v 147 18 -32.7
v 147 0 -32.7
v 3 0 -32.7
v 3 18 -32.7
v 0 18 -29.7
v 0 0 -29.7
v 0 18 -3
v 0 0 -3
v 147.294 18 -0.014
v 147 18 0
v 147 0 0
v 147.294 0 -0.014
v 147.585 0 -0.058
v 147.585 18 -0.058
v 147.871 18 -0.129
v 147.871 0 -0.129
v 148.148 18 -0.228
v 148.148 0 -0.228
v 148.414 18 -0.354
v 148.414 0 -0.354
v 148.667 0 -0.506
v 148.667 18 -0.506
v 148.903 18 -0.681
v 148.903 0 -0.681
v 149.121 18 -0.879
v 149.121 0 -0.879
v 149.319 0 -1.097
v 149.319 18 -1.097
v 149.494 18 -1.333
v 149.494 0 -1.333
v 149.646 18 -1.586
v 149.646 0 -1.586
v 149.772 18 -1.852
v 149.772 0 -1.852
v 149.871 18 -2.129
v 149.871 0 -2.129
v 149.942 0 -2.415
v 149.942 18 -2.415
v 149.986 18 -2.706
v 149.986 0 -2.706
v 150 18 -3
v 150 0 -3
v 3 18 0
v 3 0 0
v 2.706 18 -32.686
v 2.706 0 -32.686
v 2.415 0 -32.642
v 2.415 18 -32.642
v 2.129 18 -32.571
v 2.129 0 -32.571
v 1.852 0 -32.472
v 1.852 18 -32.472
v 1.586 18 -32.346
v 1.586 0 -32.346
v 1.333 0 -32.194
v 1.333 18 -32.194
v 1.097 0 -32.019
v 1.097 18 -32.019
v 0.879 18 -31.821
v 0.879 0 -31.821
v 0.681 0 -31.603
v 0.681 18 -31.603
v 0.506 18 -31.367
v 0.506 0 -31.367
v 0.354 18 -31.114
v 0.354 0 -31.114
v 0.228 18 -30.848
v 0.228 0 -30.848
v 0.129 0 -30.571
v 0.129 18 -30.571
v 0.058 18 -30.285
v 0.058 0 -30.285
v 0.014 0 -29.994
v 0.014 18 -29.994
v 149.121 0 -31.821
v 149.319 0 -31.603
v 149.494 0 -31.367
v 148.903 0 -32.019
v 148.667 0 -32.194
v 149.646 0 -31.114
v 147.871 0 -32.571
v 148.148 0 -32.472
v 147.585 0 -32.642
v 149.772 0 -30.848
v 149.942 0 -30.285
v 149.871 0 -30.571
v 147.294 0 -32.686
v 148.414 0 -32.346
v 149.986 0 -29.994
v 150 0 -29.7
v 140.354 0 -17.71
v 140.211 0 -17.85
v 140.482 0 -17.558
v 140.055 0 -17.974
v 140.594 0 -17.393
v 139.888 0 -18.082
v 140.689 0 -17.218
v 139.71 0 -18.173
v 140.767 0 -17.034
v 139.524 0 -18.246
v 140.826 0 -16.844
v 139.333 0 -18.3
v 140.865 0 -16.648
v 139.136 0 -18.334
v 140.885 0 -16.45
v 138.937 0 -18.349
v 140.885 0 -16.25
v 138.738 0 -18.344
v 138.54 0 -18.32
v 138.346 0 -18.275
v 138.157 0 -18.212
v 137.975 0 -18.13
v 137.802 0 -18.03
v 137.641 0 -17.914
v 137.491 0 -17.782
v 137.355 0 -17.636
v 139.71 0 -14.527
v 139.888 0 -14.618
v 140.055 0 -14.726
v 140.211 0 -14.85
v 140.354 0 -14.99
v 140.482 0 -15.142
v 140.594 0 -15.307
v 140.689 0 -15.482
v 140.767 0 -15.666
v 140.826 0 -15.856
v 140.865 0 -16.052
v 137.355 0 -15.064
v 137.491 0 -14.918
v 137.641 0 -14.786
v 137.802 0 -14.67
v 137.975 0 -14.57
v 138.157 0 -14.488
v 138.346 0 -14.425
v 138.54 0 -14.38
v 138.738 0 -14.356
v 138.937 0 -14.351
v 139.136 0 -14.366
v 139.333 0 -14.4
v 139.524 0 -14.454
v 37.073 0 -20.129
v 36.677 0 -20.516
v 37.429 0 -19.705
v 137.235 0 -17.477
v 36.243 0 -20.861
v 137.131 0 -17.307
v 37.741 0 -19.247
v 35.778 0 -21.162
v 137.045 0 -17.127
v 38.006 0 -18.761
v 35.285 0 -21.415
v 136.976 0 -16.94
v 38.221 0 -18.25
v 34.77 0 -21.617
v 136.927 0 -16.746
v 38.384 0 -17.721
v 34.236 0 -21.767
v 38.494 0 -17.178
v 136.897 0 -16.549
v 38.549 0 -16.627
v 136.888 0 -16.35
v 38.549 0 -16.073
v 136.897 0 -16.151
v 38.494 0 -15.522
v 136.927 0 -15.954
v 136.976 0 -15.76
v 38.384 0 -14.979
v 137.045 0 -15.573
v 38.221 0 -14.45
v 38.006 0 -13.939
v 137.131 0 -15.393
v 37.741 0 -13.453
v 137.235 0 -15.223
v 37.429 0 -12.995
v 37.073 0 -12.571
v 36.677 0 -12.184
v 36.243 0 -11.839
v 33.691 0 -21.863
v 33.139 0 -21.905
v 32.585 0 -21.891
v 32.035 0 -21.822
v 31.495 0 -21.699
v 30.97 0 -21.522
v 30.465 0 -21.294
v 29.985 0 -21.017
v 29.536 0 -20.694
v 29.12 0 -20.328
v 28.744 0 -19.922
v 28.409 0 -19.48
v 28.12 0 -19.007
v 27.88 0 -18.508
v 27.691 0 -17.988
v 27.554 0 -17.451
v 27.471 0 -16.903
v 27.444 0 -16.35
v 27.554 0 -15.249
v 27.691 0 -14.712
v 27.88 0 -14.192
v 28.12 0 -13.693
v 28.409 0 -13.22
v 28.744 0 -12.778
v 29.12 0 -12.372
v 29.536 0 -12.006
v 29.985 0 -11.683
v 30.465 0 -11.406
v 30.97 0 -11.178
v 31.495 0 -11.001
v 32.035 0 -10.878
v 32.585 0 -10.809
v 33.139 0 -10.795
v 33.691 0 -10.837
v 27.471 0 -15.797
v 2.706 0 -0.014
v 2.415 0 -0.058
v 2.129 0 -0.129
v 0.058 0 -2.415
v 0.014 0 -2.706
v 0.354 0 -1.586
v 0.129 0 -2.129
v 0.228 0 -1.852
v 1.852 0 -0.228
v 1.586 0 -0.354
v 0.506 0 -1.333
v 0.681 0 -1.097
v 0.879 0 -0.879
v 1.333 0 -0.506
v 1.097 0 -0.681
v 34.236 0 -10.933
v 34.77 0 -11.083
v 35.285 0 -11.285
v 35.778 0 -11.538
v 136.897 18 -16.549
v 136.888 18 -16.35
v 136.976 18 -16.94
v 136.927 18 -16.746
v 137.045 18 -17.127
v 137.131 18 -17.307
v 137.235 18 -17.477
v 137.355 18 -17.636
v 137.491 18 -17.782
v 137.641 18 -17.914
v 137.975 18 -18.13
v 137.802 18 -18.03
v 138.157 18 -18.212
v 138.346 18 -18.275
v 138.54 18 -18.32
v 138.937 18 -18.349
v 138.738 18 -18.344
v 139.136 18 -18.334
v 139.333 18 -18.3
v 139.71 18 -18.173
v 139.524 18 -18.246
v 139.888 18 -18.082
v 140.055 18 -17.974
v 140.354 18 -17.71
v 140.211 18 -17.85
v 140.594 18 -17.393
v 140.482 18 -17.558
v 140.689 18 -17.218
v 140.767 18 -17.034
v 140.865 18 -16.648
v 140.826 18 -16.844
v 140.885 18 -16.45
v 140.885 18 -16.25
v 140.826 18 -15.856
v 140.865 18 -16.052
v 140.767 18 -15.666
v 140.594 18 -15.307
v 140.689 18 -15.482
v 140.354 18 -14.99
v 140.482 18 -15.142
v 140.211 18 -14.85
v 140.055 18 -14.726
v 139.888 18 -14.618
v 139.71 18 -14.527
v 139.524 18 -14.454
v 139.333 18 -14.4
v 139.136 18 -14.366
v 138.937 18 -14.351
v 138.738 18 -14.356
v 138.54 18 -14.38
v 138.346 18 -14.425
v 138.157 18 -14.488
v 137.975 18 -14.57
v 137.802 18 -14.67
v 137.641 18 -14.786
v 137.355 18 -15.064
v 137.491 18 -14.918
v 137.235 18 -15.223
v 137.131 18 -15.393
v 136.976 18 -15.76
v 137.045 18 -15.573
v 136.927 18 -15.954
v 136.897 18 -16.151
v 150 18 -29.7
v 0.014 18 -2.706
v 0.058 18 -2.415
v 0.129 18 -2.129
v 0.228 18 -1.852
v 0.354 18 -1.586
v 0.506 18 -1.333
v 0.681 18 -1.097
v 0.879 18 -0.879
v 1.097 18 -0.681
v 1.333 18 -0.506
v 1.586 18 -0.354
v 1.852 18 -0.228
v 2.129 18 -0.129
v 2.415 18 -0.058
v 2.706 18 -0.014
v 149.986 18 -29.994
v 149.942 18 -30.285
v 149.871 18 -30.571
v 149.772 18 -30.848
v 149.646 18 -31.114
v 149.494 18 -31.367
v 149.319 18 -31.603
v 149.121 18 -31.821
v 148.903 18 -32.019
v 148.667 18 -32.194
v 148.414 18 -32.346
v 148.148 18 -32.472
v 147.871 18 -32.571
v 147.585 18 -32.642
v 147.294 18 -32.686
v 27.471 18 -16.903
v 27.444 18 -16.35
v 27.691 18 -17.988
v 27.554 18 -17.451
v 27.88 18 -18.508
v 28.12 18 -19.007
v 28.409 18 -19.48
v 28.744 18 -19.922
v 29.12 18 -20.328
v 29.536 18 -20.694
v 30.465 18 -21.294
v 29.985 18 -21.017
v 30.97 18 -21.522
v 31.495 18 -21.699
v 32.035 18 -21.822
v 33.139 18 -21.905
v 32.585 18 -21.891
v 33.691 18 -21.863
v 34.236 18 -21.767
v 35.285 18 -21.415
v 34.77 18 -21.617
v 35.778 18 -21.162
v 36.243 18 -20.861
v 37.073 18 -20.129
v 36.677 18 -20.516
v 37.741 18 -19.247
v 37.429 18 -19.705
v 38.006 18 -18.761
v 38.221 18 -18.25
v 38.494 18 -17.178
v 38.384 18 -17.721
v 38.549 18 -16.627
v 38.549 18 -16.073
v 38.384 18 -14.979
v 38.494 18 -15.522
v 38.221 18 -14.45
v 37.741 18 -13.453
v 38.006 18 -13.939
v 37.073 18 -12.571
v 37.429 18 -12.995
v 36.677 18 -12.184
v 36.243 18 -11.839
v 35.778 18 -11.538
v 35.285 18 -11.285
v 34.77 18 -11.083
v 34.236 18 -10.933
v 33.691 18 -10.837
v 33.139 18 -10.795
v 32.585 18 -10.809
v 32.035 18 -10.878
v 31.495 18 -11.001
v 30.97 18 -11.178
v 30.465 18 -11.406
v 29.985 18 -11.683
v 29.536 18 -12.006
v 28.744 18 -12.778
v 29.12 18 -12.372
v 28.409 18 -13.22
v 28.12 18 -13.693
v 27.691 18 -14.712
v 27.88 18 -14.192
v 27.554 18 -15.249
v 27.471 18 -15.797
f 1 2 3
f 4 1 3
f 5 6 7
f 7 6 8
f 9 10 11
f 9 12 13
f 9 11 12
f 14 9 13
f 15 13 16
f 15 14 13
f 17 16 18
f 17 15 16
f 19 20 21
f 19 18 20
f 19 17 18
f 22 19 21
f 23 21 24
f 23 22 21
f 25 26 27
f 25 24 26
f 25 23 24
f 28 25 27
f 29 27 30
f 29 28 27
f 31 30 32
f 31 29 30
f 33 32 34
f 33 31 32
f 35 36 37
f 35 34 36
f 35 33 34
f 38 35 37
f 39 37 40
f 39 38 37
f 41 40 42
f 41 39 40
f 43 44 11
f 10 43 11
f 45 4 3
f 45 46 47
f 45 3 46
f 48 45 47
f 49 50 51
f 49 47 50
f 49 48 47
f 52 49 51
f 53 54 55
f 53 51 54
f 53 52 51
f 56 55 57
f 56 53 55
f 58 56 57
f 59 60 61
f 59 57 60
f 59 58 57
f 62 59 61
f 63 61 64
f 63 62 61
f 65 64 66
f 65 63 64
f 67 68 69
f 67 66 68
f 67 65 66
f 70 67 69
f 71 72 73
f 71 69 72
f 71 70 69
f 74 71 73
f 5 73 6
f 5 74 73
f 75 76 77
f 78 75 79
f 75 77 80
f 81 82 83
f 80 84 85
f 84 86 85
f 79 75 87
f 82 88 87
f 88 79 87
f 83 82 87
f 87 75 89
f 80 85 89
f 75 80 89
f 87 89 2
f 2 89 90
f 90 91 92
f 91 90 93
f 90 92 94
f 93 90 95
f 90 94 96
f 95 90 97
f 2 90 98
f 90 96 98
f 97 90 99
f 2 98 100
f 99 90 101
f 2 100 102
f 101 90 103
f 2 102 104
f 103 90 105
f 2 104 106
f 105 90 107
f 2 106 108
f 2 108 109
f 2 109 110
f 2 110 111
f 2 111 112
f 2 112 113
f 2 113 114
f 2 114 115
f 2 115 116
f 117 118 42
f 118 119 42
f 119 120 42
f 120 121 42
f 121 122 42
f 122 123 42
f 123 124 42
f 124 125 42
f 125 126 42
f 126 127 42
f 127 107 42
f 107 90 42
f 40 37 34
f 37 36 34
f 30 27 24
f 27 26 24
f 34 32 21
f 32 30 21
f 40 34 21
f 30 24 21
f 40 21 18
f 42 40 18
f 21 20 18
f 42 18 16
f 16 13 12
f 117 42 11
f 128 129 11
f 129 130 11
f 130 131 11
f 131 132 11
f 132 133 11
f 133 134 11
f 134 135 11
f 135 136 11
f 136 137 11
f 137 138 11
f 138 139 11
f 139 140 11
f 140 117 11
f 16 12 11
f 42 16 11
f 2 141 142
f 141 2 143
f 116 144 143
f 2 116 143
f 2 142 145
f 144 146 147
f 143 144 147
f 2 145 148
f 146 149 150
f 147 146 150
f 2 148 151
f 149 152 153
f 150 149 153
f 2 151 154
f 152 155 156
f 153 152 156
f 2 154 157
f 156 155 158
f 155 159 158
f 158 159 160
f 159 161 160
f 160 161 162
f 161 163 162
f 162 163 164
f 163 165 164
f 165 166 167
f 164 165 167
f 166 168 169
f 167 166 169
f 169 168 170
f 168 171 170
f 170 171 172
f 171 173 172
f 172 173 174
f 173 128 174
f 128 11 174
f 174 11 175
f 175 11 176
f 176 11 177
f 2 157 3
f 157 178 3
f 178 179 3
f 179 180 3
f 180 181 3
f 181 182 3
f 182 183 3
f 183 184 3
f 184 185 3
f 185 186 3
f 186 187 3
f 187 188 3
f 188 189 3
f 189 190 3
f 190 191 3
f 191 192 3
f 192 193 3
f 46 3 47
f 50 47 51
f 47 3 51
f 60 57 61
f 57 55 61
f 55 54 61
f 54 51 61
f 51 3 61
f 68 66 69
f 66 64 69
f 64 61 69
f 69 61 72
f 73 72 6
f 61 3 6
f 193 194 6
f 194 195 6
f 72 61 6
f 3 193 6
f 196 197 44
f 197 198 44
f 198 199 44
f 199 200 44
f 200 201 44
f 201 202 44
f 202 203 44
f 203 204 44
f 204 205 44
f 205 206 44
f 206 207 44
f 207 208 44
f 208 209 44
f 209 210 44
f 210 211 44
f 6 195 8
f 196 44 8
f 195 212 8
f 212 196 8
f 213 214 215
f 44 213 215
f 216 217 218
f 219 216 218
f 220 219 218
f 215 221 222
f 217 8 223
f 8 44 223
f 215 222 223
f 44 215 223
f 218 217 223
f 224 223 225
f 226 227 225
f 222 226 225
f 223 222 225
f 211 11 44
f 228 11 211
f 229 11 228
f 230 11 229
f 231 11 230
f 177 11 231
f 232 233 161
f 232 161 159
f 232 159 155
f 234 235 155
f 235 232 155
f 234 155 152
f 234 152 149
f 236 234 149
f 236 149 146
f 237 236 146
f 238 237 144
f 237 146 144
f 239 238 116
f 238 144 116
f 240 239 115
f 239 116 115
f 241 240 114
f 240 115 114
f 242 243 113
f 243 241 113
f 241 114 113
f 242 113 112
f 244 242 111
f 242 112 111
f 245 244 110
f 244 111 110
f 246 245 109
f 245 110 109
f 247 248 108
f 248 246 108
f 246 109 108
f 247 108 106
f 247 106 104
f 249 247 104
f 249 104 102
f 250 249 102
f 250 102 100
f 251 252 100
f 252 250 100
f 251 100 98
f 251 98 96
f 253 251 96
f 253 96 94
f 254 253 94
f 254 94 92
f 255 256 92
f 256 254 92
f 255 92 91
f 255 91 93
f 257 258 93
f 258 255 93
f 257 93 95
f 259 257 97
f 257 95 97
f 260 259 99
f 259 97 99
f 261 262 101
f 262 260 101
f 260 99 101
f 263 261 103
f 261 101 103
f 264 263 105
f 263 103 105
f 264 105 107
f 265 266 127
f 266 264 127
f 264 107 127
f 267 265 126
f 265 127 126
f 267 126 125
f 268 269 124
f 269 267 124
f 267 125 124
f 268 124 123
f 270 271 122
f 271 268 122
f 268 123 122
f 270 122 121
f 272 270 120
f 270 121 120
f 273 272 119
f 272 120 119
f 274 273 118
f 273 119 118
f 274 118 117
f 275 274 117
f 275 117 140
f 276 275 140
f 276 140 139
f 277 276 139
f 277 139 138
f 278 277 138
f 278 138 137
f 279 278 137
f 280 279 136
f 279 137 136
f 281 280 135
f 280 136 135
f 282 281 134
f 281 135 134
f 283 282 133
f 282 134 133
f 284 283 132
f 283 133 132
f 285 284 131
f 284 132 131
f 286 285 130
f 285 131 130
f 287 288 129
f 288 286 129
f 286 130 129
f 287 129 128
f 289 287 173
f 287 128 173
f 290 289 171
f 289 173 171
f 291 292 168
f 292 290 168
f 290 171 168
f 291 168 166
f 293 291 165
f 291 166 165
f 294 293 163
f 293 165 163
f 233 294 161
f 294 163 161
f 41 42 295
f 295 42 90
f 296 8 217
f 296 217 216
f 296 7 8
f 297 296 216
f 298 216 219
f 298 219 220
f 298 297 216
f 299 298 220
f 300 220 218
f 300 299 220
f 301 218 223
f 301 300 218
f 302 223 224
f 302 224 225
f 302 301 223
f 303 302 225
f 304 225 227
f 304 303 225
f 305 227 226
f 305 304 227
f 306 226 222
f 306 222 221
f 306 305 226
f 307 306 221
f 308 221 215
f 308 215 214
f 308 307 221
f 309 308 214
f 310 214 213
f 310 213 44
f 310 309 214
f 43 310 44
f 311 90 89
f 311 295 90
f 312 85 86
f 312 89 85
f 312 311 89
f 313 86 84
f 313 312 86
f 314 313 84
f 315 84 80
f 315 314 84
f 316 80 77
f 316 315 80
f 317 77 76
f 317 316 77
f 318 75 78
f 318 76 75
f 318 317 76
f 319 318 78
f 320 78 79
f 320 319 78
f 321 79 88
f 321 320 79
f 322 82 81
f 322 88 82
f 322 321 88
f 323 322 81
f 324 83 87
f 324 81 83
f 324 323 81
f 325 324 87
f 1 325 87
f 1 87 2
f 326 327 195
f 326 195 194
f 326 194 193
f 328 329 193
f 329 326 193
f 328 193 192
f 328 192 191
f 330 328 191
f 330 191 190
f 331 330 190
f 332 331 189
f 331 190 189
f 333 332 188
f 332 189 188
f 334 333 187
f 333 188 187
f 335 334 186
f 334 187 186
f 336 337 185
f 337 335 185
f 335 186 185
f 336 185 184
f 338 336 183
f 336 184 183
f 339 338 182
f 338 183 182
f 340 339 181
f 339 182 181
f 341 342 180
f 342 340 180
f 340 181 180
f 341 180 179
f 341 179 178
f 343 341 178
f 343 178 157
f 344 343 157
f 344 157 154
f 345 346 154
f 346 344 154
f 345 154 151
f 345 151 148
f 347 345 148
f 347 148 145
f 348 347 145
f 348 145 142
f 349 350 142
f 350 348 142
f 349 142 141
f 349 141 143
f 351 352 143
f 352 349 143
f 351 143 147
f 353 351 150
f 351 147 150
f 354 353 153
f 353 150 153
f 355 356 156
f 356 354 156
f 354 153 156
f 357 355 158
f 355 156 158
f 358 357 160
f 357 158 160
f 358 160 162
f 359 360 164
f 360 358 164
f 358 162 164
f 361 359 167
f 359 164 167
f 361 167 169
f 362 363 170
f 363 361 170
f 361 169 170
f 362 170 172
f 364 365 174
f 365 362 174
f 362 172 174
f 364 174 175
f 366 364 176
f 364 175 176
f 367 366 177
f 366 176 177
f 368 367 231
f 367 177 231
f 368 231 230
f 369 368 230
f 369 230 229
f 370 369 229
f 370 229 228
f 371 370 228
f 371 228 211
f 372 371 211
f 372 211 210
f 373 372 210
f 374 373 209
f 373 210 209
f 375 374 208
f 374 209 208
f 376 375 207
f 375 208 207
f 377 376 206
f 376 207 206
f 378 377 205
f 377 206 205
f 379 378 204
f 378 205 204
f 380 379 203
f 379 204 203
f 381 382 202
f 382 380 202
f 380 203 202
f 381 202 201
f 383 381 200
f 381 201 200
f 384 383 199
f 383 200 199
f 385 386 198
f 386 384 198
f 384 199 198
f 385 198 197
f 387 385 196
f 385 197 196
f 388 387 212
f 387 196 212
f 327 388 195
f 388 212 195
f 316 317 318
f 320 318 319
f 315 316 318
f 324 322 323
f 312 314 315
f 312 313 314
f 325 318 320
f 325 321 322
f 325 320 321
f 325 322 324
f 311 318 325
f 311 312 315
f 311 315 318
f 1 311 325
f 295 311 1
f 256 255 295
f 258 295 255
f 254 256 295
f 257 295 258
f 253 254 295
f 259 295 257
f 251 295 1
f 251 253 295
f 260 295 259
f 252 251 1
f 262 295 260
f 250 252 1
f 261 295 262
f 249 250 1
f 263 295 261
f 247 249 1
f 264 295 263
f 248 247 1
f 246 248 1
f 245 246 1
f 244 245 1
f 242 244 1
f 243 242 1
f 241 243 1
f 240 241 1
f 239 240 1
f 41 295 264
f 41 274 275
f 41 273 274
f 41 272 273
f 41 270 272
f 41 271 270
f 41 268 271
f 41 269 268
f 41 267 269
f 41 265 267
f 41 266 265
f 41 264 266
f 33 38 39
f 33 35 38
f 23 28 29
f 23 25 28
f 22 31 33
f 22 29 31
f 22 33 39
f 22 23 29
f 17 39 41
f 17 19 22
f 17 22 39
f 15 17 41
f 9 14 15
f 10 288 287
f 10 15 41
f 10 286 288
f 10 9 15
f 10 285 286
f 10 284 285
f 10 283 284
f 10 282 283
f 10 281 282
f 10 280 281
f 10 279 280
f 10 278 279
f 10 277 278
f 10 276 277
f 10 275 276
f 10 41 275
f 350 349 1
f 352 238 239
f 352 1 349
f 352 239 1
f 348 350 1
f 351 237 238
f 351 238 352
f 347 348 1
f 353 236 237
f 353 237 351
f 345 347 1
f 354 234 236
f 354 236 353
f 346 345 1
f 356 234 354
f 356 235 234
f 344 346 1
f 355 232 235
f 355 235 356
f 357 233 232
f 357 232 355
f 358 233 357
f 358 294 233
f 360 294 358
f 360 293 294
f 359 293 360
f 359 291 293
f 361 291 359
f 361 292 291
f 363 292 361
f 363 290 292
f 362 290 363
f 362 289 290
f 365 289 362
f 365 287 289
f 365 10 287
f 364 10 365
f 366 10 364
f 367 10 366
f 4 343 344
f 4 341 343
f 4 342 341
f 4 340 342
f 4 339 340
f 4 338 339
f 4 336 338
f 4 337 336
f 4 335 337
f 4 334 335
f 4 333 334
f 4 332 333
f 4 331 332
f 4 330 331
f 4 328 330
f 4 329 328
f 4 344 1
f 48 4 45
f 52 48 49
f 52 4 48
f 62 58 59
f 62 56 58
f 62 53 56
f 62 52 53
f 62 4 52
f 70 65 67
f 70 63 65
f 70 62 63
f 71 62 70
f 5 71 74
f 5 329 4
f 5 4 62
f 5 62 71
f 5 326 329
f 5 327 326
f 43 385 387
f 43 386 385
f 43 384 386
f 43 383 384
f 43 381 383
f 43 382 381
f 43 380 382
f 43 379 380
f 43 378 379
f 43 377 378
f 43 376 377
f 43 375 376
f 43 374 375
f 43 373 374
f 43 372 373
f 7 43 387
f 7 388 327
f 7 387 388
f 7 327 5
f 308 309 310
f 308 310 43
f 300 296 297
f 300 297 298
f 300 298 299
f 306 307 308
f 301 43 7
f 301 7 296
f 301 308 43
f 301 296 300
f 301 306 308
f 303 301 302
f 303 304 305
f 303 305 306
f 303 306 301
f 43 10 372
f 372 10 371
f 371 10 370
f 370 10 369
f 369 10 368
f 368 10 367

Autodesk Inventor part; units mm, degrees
ref_plane "YZ Plane" through (0, 0, 0) normal (1, 0, 0) x (0, 1, 0)
ref_plane "XZ Plane" through (0, 0, 0) normal (0, 1, 0) x (-1, 0, 0)
ref_plane "XY Plane" through (0, 0, 0) normal (0, 0, 1) x (1, 0, 0)
sketch "Sketch1" plane through (0, 0, 0) normal (0, 1, 0) x (-1, 0, 0)
  line L0 (0, 0) -> (-150, 0)
  line L1 (-150, 0) -> (-150, -32.7)
  line L2 (-150, -32.7) -> (0, -32.7)
  line L3 (0, -32.7) -> (0, 0)
  circle A0 centre (-33, -16.35) radius 5.5563
  circle A1 centre (-138.8875, -16.35) radius 2
  point P0 (0, -16.35)
  point P1 (-150, -16.35)
  dimension "d0" = 150
  dimension "d1" = 32.7
  dimension "d2" = 33
  dimension "d3" = 11.1125
  dimension "d4" = 11.1125
  dimension "Diametro_eje_pequeño" = 4
extrude "Extrusion1" add sketch "Sketch1" along normal blind 18
fillet "Fillet1" radius 3 4 edges at (0, 9, 0) (150, 9, 0) (150, 9, -32.7) (0, 9, -32.7)
equation "\"d1\" = ancho"
equation "\"d2\" = separacion_grande"
equation "\"d3\" = diametro_interno"
equation "\"d4\" = d3"
equation "\"Diametro_eje_pequeño\" = Diametro_eje_pequeño_1"
equation "\"ancho\" = 32.7"
equation "\"separacion_grande\" = 33"
equation "\"diametro_interno\" = 11.1125"
equation "\"Diametro_eje_pequeño_1\" = 4"
properties part number "Transmisor_grande" material "Aluminum 6061"
